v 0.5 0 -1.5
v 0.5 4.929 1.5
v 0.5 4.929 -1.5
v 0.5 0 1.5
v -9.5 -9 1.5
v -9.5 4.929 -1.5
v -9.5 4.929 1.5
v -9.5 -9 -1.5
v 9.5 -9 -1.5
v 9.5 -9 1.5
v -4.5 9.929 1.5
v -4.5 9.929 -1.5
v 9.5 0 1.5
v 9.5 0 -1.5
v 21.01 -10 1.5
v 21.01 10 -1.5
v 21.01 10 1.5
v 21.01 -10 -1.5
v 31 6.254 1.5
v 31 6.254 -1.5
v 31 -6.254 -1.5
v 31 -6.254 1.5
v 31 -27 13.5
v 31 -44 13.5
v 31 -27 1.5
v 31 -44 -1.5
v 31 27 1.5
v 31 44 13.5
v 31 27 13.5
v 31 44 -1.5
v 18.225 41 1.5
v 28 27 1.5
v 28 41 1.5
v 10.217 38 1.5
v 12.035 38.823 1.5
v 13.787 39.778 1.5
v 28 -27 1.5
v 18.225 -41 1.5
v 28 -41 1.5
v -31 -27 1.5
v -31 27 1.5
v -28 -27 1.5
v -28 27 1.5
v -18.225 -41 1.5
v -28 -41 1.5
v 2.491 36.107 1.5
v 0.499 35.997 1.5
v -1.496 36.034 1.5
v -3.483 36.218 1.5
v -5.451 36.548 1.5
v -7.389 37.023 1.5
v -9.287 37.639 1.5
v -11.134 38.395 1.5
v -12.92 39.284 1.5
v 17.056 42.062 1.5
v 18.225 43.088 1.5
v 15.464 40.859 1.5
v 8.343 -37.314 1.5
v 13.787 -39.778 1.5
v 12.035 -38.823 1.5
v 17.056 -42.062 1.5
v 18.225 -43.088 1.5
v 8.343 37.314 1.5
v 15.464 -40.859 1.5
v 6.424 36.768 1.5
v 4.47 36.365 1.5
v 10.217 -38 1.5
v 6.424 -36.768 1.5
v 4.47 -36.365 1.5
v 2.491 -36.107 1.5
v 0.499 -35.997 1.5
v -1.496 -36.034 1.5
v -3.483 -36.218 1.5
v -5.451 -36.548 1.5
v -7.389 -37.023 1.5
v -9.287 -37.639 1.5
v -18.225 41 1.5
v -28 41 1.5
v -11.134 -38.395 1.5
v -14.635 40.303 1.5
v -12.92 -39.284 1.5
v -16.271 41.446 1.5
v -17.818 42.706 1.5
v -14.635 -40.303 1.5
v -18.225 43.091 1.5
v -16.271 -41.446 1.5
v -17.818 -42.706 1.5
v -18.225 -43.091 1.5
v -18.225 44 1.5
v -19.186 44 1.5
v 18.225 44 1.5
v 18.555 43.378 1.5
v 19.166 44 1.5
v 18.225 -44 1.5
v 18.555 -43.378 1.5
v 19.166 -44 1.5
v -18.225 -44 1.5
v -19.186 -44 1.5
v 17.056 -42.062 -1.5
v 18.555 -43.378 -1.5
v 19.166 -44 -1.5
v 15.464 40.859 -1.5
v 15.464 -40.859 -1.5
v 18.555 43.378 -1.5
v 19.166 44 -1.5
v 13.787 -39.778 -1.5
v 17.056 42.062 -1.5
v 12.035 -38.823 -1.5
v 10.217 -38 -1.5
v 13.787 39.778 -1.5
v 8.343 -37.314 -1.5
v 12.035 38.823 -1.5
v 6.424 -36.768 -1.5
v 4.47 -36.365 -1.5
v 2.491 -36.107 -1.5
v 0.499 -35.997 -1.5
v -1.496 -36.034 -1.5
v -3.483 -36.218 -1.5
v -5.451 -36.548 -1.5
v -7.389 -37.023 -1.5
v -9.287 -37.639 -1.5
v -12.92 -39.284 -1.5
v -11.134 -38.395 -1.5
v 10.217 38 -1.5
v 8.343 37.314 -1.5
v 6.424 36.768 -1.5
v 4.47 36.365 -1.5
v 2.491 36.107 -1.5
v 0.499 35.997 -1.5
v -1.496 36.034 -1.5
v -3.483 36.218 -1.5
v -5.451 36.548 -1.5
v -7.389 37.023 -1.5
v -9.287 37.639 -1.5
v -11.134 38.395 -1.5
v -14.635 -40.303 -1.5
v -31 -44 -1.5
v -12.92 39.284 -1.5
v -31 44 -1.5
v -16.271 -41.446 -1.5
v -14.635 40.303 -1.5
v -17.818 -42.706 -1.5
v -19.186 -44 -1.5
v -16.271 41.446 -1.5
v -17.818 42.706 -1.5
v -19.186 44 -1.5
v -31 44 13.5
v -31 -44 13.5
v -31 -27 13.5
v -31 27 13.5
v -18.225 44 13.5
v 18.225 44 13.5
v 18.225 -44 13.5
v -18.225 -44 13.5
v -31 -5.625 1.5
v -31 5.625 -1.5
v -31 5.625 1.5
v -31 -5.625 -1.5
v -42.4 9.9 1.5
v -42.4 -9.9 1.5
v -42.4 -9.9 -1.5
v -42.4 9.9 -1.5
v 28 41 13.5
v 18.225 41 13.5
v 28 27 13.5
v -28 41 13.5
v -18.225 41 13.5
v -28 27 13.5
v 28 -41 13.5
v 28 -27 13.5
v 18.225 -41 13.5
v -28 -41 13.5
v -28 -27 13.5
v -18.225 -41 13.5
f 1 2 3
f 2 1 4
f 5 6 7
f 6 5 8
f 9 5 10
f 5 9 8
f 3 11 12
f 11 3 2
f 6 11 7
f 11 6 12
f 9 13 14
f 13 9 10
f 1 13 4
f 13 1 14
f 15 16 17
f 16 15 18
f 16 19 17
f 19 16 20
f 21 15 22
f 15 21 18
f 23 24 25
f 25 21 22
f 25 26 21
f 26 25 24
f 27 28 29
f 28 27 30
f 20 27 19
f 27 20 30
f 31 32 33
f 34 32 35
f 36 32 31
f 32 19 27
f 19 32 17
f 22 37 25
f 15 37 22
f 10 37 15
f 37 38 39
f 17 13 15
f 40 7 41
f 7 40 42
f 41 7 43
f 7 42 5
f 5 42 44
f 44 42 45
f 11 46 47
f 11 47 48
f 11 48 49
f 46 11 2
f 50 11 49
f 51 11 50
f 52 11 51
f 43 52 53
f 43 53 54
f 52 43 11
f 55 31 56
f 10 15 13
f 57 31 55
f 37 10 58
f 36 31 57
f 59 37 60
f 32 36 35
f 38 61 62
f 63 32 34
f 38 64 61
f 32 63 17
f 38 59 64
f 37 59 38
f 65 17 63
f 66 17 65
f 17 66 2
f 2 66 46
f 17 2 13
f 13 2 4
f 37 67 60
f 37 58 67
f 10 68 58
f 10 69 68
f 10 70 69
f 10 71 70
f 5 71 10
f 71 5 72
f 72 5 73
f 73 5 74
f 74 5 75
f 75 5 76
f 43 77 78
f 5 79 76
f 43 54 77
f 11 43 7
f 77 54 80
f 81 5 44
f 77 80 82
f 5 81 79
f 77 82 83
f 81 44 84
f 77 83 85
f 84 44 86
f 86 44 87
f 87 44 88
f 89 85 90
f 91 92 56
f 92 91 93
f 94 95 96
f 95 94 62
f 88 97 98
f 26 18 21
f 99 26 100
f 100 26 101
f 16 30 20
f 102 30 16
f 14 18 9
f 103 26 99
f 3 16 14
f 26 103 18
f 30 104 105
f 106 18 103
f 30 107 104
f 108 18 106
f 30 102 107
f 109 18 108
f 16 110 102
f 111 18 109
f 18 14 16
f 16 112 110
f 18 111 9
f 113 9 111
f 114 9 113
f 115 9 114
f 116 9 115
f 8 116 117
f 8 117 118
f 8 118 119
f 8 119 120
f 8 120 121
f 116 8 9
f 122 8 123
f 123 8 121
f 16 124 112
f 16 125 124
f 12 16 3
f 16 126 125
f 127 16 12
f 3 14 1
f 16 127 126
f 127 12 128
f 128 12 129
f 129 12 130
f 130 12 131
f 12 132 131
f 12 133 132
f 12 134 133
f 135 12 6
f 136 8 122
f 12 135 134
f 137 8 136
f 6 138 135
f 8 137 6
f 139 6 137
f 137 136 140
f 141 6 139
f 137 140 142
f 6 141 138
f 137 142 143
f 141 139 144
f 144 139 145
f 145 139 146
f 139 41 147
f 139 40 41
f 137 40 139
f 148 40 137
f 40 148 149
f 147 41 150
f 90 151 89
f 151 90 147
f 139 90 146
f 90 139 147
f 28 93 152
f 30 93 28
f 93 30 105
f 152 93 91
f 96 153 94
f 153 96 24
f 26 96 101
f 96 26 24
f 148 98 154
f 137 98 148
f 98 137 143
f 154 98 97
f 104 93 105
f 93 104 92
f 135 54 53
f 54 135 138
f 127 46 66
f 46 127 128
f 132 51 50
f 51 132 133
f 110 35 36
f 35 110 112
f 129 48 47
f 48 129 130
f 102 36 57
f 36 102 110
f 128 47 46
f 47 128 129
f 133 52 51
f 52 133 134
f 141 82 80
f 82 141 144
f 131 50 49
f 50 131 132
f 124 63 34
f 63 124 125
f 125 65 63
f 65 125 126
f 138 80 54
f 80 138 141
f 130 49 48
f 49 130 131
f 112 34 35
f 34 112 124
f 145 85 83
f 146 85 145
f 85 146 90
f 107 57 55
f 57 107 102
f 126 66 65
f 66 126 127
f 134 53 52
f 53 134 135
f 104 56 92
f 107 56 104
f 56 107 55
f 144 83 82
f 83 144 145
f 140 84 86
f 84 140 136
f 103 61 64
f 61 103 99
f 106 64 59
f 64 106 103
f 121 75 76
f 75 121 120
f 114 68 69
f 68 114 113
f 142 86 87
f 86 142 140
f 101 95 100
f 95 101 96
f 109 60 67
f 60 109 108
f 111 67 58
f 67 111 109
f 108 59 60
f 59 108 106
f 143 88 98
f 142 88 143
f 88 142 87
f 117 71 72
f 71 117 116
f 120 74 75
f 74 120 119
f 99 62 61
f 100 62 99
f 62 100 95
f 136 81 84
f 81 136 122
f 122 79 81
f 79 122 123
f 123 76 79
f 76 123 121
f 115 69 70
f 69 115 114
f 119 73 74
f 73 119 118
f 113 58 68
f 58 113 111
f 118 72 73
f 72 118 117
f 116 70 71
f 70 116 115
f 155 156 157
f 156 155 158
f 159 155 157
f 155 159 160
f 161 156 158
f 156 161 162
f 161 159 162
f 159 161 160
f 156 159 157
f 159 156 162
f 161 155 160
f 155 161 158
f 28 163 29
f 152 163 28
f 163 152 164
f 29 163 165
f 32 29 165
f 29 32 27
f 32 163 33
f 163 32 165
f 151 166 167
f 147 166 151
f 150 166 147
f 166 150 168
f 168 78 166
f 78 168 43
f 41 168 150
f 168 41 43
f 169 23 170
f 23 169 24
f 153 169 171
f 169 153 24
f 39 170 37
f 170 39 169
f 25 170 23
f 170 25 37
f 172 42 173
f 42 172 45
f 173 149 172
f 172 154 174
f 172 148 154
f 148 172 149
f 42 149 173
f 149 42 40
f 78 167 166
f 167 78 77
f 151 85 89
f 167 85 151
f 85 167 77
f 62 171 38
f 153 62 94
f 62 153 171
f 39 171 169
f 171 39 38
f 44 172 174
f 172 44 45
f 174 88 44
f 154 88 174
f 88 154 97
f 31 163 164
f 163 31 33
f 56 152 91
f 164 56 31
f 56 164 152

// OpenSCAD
//Settlers game card holder
// 1 to 1 copy of previous blender version but with parameters for changeing dimention

//Constants
// Card short side in mm (Default settlers card 54mm)
card_x = 54;

// Card long side in mm (Default settlers card 80mm)
card_y = 80;

show_logo = "yes"; // [yes,no]

connectors = "yes";  // [yes,no]

// Gap between card and the walls of the holder
card_space = 2; //original 2
wall_thickness = 3; //original 2
plate_height = 3; //original 2
wall_height = 12; //original 12
shortwall_cut = card_x/(card_y/card_x);
shortwall = (card_x-shortwall_cut)/2+wall_thickness+card_space/2;

//Connecting piece
//the "female" part is 21mm at the biggest point and 12.5mm at the smallest and 10mm deep
//the "male" part is  19.8mm at the biggest point and 10.46mm at smallest and 11.4mm long
//the odd numbers are because i used a manualy freehand modifed box with no real grid snapping, and some random scaling
// ignore variable values
female_con_x = 10+1-1;
female_con_y1 = 21+1-2;
female_con_y2 = 12.5+1-1;
male_con_x = 11.4+1-1;
male_con_y1 = 19.8+1-1;
male_con_y2 = 10.46+1-1;
angle = atan( ((female_con_y1-female_con_y2)/2) / female_con_x ); // same for both


	

union() {

	difference() {
		//Base plate
		cube(size = [card_x+card_space+wall_thickness*2, card_y+card_space+wall_thickness*2,plate_height], center = true);
		//Round Cut
		// was made with a cylinder with radius=32 scaled in x and y by 0.8, resulting in R=25.6 and that is aprox card_x
		translate([0,card_y/1.27,-card_x/4])
		cylinder(card_x/2, card_x/2, card_x/2, $fa=2);
		translate([0,-card_y/1.27,-card_x/4])
		cylinder(card_x/2, card_x/2, card_x/2, $fa=2);
		
		//Logo
		if (show_logo == "yes") {
			union() {
				translate([0, -4.5, 0])
				cube(size = [19,9,10], center = true);
				difference() {
					translate([-4.5, 0.5 ,0])
					cube(size = [10,19,10], center = true);
					translate([0.5, 12 ,0])
					rotate([0, 0, 45])
					cube(size = [10,12,11], center = true);
					translate([-9.5, 12 ,0])
					rotate([0, 0, 45])
					cube(size = [12,10,11], center = true);
				}
			}
		}
		
		//female con
		if (connectors == "yes") {
			translate( [ (card_x/2) - female_con_x + card_space/2 + wall_thickness +0.01 , -female_con_y1/2, -plate_height ] ) //0.01 is for overlapping
			difference() {
				cube(size = [female_con_x, female_con_y1, plate_height*2], center = false);
				translate( [ 0,female_con_y1,-1 ] )
				rotate([0, 0, -angle])
				cube(female_con_x*2);
				translate( [ 0,0,-1 ] )
				rotate([0, 0, angle-90])
				cube(female_con_x*2);
			}
		}
	}

	//male con
	if (connectors == "yes") {
		translate( [ -(card_x/2) - card_space/2 - wall_thickness - male_con_x, -male_con_y1/2, -plate_height/2 ] ) 
		difference() {
			cube(size = [male_con_x, male_con_y1, plate_height], center = false);
			translate( [ 0,male_con_y1,-1 ] )
			rotate([0, 0, -angle])
			cube(male_con_x*2);
			translate( [ 0,0,-1 ] )
			rotate([0, 0, angle-90])
			cube(male_con_x*2);
		}
	}

	//Cards for reference
	//%cube(size = [card_x,card_y,9], center = true);
	//%cube(size = [card_y,card_x,9], center = true);
	
	//%cube(size= [shortwall_cut, 100,20], center = true);
	
	// Long wall 1 of 4
	translate([  (card_x+card_space+wall_thickness*2)/2 , (card_y+card_space+wall_thickness*2)/2 ,plate_height/2])
	rotate([0,0,180])
	cube(size = [wall_thickness,(card_y-card_x)/2+wall_thickness+card_space/2,wall_height] ,center = false);
	
	// Long wall 2 of 4
	translate([  -(card_x+card_space+wall_thickness*2)/2 +wall_thickness , (card_y+card_space+wall_thickness*2)/2 ,plate_height/2])
	rotate([0,0,180])
	cube(size = [wall_thickness,(card_y-card_x)/2+wall_thickness+card_space/2,wall_height] ,center = false);
	
	// Long wall 3 of 4
	translate([  (card_x+card_space+wall_thickness*2)/2 -wall_thickness, -(card_y+card_space+wall_thickness*2)/2 ,plate_height/2])
	rotate([0,0,0])
	cube(size = [wall_thickness,(card_y-card_x)/2+wall_thickness+card_space/2,wall_height] ,center = false);
	
	// Long wall 4 of 4
	translate([  -(card_x+card_space+wall_thickness*2)/2 , -(card_y+card_space+wall_thickness*2)/2 ,plate_height/2])
	rotate([0,0,0])
	cube(size = [wall_thickness,(card_y-card_x)/2+wall_thickness+card_space/2,wall_height] ,center = false);
	
	//Shortwall 1 of 4
	//the cut to make the space between the walls was originaly 37mm
	translate([  -(card_x+card_space+wall_thickness*2)/2  , (card_y+card_space+wall_thickness*2)/2 ,plate_height/2])
	rotate([0,0,270])
	cube(size = [wall_thickness, shortwall , wall_height] ,center = false);
	
	//Shortwall 2 of 4
	//the cut to make the space between the walls was originaly 37mm
	translate([  (card_x+card_space+wall_thickness*2)/2 , -(card_y+card_space+wall_thickness*2)/2 ,plate_height/2])
	rotate([0,0,90])
	cube(size = [wall_thickness, shortwall , wall_height] ,center = false);
	
	//Shortwall 3 of 4
	//the cut to make the space between the walls was originaly 37mm
	translate([  -(card_x+card_space+wall_thickness*2)/2 , -(card_y+card_space+wall_thickness*2)/2 +wall_thickness ,plate_height/2])
	rotate([0,0,270])
	cube(size = [wall_thickness, shortwall , wall_height] ,center = false);
	
	//Shortwall 4 of 4
	//the cut to make the space between the walls was originaly 37mm
	translate([  (card_x+card_space+wall_thickness*2)/2 , (card_y+card_space+wall_thickness*2)/2 -wall_thickness ,plate_height/2])
	rotate([0,0,90])
	cube(size = [wall_thickness, shortwall , wall_height] ,center = false);
	

}
